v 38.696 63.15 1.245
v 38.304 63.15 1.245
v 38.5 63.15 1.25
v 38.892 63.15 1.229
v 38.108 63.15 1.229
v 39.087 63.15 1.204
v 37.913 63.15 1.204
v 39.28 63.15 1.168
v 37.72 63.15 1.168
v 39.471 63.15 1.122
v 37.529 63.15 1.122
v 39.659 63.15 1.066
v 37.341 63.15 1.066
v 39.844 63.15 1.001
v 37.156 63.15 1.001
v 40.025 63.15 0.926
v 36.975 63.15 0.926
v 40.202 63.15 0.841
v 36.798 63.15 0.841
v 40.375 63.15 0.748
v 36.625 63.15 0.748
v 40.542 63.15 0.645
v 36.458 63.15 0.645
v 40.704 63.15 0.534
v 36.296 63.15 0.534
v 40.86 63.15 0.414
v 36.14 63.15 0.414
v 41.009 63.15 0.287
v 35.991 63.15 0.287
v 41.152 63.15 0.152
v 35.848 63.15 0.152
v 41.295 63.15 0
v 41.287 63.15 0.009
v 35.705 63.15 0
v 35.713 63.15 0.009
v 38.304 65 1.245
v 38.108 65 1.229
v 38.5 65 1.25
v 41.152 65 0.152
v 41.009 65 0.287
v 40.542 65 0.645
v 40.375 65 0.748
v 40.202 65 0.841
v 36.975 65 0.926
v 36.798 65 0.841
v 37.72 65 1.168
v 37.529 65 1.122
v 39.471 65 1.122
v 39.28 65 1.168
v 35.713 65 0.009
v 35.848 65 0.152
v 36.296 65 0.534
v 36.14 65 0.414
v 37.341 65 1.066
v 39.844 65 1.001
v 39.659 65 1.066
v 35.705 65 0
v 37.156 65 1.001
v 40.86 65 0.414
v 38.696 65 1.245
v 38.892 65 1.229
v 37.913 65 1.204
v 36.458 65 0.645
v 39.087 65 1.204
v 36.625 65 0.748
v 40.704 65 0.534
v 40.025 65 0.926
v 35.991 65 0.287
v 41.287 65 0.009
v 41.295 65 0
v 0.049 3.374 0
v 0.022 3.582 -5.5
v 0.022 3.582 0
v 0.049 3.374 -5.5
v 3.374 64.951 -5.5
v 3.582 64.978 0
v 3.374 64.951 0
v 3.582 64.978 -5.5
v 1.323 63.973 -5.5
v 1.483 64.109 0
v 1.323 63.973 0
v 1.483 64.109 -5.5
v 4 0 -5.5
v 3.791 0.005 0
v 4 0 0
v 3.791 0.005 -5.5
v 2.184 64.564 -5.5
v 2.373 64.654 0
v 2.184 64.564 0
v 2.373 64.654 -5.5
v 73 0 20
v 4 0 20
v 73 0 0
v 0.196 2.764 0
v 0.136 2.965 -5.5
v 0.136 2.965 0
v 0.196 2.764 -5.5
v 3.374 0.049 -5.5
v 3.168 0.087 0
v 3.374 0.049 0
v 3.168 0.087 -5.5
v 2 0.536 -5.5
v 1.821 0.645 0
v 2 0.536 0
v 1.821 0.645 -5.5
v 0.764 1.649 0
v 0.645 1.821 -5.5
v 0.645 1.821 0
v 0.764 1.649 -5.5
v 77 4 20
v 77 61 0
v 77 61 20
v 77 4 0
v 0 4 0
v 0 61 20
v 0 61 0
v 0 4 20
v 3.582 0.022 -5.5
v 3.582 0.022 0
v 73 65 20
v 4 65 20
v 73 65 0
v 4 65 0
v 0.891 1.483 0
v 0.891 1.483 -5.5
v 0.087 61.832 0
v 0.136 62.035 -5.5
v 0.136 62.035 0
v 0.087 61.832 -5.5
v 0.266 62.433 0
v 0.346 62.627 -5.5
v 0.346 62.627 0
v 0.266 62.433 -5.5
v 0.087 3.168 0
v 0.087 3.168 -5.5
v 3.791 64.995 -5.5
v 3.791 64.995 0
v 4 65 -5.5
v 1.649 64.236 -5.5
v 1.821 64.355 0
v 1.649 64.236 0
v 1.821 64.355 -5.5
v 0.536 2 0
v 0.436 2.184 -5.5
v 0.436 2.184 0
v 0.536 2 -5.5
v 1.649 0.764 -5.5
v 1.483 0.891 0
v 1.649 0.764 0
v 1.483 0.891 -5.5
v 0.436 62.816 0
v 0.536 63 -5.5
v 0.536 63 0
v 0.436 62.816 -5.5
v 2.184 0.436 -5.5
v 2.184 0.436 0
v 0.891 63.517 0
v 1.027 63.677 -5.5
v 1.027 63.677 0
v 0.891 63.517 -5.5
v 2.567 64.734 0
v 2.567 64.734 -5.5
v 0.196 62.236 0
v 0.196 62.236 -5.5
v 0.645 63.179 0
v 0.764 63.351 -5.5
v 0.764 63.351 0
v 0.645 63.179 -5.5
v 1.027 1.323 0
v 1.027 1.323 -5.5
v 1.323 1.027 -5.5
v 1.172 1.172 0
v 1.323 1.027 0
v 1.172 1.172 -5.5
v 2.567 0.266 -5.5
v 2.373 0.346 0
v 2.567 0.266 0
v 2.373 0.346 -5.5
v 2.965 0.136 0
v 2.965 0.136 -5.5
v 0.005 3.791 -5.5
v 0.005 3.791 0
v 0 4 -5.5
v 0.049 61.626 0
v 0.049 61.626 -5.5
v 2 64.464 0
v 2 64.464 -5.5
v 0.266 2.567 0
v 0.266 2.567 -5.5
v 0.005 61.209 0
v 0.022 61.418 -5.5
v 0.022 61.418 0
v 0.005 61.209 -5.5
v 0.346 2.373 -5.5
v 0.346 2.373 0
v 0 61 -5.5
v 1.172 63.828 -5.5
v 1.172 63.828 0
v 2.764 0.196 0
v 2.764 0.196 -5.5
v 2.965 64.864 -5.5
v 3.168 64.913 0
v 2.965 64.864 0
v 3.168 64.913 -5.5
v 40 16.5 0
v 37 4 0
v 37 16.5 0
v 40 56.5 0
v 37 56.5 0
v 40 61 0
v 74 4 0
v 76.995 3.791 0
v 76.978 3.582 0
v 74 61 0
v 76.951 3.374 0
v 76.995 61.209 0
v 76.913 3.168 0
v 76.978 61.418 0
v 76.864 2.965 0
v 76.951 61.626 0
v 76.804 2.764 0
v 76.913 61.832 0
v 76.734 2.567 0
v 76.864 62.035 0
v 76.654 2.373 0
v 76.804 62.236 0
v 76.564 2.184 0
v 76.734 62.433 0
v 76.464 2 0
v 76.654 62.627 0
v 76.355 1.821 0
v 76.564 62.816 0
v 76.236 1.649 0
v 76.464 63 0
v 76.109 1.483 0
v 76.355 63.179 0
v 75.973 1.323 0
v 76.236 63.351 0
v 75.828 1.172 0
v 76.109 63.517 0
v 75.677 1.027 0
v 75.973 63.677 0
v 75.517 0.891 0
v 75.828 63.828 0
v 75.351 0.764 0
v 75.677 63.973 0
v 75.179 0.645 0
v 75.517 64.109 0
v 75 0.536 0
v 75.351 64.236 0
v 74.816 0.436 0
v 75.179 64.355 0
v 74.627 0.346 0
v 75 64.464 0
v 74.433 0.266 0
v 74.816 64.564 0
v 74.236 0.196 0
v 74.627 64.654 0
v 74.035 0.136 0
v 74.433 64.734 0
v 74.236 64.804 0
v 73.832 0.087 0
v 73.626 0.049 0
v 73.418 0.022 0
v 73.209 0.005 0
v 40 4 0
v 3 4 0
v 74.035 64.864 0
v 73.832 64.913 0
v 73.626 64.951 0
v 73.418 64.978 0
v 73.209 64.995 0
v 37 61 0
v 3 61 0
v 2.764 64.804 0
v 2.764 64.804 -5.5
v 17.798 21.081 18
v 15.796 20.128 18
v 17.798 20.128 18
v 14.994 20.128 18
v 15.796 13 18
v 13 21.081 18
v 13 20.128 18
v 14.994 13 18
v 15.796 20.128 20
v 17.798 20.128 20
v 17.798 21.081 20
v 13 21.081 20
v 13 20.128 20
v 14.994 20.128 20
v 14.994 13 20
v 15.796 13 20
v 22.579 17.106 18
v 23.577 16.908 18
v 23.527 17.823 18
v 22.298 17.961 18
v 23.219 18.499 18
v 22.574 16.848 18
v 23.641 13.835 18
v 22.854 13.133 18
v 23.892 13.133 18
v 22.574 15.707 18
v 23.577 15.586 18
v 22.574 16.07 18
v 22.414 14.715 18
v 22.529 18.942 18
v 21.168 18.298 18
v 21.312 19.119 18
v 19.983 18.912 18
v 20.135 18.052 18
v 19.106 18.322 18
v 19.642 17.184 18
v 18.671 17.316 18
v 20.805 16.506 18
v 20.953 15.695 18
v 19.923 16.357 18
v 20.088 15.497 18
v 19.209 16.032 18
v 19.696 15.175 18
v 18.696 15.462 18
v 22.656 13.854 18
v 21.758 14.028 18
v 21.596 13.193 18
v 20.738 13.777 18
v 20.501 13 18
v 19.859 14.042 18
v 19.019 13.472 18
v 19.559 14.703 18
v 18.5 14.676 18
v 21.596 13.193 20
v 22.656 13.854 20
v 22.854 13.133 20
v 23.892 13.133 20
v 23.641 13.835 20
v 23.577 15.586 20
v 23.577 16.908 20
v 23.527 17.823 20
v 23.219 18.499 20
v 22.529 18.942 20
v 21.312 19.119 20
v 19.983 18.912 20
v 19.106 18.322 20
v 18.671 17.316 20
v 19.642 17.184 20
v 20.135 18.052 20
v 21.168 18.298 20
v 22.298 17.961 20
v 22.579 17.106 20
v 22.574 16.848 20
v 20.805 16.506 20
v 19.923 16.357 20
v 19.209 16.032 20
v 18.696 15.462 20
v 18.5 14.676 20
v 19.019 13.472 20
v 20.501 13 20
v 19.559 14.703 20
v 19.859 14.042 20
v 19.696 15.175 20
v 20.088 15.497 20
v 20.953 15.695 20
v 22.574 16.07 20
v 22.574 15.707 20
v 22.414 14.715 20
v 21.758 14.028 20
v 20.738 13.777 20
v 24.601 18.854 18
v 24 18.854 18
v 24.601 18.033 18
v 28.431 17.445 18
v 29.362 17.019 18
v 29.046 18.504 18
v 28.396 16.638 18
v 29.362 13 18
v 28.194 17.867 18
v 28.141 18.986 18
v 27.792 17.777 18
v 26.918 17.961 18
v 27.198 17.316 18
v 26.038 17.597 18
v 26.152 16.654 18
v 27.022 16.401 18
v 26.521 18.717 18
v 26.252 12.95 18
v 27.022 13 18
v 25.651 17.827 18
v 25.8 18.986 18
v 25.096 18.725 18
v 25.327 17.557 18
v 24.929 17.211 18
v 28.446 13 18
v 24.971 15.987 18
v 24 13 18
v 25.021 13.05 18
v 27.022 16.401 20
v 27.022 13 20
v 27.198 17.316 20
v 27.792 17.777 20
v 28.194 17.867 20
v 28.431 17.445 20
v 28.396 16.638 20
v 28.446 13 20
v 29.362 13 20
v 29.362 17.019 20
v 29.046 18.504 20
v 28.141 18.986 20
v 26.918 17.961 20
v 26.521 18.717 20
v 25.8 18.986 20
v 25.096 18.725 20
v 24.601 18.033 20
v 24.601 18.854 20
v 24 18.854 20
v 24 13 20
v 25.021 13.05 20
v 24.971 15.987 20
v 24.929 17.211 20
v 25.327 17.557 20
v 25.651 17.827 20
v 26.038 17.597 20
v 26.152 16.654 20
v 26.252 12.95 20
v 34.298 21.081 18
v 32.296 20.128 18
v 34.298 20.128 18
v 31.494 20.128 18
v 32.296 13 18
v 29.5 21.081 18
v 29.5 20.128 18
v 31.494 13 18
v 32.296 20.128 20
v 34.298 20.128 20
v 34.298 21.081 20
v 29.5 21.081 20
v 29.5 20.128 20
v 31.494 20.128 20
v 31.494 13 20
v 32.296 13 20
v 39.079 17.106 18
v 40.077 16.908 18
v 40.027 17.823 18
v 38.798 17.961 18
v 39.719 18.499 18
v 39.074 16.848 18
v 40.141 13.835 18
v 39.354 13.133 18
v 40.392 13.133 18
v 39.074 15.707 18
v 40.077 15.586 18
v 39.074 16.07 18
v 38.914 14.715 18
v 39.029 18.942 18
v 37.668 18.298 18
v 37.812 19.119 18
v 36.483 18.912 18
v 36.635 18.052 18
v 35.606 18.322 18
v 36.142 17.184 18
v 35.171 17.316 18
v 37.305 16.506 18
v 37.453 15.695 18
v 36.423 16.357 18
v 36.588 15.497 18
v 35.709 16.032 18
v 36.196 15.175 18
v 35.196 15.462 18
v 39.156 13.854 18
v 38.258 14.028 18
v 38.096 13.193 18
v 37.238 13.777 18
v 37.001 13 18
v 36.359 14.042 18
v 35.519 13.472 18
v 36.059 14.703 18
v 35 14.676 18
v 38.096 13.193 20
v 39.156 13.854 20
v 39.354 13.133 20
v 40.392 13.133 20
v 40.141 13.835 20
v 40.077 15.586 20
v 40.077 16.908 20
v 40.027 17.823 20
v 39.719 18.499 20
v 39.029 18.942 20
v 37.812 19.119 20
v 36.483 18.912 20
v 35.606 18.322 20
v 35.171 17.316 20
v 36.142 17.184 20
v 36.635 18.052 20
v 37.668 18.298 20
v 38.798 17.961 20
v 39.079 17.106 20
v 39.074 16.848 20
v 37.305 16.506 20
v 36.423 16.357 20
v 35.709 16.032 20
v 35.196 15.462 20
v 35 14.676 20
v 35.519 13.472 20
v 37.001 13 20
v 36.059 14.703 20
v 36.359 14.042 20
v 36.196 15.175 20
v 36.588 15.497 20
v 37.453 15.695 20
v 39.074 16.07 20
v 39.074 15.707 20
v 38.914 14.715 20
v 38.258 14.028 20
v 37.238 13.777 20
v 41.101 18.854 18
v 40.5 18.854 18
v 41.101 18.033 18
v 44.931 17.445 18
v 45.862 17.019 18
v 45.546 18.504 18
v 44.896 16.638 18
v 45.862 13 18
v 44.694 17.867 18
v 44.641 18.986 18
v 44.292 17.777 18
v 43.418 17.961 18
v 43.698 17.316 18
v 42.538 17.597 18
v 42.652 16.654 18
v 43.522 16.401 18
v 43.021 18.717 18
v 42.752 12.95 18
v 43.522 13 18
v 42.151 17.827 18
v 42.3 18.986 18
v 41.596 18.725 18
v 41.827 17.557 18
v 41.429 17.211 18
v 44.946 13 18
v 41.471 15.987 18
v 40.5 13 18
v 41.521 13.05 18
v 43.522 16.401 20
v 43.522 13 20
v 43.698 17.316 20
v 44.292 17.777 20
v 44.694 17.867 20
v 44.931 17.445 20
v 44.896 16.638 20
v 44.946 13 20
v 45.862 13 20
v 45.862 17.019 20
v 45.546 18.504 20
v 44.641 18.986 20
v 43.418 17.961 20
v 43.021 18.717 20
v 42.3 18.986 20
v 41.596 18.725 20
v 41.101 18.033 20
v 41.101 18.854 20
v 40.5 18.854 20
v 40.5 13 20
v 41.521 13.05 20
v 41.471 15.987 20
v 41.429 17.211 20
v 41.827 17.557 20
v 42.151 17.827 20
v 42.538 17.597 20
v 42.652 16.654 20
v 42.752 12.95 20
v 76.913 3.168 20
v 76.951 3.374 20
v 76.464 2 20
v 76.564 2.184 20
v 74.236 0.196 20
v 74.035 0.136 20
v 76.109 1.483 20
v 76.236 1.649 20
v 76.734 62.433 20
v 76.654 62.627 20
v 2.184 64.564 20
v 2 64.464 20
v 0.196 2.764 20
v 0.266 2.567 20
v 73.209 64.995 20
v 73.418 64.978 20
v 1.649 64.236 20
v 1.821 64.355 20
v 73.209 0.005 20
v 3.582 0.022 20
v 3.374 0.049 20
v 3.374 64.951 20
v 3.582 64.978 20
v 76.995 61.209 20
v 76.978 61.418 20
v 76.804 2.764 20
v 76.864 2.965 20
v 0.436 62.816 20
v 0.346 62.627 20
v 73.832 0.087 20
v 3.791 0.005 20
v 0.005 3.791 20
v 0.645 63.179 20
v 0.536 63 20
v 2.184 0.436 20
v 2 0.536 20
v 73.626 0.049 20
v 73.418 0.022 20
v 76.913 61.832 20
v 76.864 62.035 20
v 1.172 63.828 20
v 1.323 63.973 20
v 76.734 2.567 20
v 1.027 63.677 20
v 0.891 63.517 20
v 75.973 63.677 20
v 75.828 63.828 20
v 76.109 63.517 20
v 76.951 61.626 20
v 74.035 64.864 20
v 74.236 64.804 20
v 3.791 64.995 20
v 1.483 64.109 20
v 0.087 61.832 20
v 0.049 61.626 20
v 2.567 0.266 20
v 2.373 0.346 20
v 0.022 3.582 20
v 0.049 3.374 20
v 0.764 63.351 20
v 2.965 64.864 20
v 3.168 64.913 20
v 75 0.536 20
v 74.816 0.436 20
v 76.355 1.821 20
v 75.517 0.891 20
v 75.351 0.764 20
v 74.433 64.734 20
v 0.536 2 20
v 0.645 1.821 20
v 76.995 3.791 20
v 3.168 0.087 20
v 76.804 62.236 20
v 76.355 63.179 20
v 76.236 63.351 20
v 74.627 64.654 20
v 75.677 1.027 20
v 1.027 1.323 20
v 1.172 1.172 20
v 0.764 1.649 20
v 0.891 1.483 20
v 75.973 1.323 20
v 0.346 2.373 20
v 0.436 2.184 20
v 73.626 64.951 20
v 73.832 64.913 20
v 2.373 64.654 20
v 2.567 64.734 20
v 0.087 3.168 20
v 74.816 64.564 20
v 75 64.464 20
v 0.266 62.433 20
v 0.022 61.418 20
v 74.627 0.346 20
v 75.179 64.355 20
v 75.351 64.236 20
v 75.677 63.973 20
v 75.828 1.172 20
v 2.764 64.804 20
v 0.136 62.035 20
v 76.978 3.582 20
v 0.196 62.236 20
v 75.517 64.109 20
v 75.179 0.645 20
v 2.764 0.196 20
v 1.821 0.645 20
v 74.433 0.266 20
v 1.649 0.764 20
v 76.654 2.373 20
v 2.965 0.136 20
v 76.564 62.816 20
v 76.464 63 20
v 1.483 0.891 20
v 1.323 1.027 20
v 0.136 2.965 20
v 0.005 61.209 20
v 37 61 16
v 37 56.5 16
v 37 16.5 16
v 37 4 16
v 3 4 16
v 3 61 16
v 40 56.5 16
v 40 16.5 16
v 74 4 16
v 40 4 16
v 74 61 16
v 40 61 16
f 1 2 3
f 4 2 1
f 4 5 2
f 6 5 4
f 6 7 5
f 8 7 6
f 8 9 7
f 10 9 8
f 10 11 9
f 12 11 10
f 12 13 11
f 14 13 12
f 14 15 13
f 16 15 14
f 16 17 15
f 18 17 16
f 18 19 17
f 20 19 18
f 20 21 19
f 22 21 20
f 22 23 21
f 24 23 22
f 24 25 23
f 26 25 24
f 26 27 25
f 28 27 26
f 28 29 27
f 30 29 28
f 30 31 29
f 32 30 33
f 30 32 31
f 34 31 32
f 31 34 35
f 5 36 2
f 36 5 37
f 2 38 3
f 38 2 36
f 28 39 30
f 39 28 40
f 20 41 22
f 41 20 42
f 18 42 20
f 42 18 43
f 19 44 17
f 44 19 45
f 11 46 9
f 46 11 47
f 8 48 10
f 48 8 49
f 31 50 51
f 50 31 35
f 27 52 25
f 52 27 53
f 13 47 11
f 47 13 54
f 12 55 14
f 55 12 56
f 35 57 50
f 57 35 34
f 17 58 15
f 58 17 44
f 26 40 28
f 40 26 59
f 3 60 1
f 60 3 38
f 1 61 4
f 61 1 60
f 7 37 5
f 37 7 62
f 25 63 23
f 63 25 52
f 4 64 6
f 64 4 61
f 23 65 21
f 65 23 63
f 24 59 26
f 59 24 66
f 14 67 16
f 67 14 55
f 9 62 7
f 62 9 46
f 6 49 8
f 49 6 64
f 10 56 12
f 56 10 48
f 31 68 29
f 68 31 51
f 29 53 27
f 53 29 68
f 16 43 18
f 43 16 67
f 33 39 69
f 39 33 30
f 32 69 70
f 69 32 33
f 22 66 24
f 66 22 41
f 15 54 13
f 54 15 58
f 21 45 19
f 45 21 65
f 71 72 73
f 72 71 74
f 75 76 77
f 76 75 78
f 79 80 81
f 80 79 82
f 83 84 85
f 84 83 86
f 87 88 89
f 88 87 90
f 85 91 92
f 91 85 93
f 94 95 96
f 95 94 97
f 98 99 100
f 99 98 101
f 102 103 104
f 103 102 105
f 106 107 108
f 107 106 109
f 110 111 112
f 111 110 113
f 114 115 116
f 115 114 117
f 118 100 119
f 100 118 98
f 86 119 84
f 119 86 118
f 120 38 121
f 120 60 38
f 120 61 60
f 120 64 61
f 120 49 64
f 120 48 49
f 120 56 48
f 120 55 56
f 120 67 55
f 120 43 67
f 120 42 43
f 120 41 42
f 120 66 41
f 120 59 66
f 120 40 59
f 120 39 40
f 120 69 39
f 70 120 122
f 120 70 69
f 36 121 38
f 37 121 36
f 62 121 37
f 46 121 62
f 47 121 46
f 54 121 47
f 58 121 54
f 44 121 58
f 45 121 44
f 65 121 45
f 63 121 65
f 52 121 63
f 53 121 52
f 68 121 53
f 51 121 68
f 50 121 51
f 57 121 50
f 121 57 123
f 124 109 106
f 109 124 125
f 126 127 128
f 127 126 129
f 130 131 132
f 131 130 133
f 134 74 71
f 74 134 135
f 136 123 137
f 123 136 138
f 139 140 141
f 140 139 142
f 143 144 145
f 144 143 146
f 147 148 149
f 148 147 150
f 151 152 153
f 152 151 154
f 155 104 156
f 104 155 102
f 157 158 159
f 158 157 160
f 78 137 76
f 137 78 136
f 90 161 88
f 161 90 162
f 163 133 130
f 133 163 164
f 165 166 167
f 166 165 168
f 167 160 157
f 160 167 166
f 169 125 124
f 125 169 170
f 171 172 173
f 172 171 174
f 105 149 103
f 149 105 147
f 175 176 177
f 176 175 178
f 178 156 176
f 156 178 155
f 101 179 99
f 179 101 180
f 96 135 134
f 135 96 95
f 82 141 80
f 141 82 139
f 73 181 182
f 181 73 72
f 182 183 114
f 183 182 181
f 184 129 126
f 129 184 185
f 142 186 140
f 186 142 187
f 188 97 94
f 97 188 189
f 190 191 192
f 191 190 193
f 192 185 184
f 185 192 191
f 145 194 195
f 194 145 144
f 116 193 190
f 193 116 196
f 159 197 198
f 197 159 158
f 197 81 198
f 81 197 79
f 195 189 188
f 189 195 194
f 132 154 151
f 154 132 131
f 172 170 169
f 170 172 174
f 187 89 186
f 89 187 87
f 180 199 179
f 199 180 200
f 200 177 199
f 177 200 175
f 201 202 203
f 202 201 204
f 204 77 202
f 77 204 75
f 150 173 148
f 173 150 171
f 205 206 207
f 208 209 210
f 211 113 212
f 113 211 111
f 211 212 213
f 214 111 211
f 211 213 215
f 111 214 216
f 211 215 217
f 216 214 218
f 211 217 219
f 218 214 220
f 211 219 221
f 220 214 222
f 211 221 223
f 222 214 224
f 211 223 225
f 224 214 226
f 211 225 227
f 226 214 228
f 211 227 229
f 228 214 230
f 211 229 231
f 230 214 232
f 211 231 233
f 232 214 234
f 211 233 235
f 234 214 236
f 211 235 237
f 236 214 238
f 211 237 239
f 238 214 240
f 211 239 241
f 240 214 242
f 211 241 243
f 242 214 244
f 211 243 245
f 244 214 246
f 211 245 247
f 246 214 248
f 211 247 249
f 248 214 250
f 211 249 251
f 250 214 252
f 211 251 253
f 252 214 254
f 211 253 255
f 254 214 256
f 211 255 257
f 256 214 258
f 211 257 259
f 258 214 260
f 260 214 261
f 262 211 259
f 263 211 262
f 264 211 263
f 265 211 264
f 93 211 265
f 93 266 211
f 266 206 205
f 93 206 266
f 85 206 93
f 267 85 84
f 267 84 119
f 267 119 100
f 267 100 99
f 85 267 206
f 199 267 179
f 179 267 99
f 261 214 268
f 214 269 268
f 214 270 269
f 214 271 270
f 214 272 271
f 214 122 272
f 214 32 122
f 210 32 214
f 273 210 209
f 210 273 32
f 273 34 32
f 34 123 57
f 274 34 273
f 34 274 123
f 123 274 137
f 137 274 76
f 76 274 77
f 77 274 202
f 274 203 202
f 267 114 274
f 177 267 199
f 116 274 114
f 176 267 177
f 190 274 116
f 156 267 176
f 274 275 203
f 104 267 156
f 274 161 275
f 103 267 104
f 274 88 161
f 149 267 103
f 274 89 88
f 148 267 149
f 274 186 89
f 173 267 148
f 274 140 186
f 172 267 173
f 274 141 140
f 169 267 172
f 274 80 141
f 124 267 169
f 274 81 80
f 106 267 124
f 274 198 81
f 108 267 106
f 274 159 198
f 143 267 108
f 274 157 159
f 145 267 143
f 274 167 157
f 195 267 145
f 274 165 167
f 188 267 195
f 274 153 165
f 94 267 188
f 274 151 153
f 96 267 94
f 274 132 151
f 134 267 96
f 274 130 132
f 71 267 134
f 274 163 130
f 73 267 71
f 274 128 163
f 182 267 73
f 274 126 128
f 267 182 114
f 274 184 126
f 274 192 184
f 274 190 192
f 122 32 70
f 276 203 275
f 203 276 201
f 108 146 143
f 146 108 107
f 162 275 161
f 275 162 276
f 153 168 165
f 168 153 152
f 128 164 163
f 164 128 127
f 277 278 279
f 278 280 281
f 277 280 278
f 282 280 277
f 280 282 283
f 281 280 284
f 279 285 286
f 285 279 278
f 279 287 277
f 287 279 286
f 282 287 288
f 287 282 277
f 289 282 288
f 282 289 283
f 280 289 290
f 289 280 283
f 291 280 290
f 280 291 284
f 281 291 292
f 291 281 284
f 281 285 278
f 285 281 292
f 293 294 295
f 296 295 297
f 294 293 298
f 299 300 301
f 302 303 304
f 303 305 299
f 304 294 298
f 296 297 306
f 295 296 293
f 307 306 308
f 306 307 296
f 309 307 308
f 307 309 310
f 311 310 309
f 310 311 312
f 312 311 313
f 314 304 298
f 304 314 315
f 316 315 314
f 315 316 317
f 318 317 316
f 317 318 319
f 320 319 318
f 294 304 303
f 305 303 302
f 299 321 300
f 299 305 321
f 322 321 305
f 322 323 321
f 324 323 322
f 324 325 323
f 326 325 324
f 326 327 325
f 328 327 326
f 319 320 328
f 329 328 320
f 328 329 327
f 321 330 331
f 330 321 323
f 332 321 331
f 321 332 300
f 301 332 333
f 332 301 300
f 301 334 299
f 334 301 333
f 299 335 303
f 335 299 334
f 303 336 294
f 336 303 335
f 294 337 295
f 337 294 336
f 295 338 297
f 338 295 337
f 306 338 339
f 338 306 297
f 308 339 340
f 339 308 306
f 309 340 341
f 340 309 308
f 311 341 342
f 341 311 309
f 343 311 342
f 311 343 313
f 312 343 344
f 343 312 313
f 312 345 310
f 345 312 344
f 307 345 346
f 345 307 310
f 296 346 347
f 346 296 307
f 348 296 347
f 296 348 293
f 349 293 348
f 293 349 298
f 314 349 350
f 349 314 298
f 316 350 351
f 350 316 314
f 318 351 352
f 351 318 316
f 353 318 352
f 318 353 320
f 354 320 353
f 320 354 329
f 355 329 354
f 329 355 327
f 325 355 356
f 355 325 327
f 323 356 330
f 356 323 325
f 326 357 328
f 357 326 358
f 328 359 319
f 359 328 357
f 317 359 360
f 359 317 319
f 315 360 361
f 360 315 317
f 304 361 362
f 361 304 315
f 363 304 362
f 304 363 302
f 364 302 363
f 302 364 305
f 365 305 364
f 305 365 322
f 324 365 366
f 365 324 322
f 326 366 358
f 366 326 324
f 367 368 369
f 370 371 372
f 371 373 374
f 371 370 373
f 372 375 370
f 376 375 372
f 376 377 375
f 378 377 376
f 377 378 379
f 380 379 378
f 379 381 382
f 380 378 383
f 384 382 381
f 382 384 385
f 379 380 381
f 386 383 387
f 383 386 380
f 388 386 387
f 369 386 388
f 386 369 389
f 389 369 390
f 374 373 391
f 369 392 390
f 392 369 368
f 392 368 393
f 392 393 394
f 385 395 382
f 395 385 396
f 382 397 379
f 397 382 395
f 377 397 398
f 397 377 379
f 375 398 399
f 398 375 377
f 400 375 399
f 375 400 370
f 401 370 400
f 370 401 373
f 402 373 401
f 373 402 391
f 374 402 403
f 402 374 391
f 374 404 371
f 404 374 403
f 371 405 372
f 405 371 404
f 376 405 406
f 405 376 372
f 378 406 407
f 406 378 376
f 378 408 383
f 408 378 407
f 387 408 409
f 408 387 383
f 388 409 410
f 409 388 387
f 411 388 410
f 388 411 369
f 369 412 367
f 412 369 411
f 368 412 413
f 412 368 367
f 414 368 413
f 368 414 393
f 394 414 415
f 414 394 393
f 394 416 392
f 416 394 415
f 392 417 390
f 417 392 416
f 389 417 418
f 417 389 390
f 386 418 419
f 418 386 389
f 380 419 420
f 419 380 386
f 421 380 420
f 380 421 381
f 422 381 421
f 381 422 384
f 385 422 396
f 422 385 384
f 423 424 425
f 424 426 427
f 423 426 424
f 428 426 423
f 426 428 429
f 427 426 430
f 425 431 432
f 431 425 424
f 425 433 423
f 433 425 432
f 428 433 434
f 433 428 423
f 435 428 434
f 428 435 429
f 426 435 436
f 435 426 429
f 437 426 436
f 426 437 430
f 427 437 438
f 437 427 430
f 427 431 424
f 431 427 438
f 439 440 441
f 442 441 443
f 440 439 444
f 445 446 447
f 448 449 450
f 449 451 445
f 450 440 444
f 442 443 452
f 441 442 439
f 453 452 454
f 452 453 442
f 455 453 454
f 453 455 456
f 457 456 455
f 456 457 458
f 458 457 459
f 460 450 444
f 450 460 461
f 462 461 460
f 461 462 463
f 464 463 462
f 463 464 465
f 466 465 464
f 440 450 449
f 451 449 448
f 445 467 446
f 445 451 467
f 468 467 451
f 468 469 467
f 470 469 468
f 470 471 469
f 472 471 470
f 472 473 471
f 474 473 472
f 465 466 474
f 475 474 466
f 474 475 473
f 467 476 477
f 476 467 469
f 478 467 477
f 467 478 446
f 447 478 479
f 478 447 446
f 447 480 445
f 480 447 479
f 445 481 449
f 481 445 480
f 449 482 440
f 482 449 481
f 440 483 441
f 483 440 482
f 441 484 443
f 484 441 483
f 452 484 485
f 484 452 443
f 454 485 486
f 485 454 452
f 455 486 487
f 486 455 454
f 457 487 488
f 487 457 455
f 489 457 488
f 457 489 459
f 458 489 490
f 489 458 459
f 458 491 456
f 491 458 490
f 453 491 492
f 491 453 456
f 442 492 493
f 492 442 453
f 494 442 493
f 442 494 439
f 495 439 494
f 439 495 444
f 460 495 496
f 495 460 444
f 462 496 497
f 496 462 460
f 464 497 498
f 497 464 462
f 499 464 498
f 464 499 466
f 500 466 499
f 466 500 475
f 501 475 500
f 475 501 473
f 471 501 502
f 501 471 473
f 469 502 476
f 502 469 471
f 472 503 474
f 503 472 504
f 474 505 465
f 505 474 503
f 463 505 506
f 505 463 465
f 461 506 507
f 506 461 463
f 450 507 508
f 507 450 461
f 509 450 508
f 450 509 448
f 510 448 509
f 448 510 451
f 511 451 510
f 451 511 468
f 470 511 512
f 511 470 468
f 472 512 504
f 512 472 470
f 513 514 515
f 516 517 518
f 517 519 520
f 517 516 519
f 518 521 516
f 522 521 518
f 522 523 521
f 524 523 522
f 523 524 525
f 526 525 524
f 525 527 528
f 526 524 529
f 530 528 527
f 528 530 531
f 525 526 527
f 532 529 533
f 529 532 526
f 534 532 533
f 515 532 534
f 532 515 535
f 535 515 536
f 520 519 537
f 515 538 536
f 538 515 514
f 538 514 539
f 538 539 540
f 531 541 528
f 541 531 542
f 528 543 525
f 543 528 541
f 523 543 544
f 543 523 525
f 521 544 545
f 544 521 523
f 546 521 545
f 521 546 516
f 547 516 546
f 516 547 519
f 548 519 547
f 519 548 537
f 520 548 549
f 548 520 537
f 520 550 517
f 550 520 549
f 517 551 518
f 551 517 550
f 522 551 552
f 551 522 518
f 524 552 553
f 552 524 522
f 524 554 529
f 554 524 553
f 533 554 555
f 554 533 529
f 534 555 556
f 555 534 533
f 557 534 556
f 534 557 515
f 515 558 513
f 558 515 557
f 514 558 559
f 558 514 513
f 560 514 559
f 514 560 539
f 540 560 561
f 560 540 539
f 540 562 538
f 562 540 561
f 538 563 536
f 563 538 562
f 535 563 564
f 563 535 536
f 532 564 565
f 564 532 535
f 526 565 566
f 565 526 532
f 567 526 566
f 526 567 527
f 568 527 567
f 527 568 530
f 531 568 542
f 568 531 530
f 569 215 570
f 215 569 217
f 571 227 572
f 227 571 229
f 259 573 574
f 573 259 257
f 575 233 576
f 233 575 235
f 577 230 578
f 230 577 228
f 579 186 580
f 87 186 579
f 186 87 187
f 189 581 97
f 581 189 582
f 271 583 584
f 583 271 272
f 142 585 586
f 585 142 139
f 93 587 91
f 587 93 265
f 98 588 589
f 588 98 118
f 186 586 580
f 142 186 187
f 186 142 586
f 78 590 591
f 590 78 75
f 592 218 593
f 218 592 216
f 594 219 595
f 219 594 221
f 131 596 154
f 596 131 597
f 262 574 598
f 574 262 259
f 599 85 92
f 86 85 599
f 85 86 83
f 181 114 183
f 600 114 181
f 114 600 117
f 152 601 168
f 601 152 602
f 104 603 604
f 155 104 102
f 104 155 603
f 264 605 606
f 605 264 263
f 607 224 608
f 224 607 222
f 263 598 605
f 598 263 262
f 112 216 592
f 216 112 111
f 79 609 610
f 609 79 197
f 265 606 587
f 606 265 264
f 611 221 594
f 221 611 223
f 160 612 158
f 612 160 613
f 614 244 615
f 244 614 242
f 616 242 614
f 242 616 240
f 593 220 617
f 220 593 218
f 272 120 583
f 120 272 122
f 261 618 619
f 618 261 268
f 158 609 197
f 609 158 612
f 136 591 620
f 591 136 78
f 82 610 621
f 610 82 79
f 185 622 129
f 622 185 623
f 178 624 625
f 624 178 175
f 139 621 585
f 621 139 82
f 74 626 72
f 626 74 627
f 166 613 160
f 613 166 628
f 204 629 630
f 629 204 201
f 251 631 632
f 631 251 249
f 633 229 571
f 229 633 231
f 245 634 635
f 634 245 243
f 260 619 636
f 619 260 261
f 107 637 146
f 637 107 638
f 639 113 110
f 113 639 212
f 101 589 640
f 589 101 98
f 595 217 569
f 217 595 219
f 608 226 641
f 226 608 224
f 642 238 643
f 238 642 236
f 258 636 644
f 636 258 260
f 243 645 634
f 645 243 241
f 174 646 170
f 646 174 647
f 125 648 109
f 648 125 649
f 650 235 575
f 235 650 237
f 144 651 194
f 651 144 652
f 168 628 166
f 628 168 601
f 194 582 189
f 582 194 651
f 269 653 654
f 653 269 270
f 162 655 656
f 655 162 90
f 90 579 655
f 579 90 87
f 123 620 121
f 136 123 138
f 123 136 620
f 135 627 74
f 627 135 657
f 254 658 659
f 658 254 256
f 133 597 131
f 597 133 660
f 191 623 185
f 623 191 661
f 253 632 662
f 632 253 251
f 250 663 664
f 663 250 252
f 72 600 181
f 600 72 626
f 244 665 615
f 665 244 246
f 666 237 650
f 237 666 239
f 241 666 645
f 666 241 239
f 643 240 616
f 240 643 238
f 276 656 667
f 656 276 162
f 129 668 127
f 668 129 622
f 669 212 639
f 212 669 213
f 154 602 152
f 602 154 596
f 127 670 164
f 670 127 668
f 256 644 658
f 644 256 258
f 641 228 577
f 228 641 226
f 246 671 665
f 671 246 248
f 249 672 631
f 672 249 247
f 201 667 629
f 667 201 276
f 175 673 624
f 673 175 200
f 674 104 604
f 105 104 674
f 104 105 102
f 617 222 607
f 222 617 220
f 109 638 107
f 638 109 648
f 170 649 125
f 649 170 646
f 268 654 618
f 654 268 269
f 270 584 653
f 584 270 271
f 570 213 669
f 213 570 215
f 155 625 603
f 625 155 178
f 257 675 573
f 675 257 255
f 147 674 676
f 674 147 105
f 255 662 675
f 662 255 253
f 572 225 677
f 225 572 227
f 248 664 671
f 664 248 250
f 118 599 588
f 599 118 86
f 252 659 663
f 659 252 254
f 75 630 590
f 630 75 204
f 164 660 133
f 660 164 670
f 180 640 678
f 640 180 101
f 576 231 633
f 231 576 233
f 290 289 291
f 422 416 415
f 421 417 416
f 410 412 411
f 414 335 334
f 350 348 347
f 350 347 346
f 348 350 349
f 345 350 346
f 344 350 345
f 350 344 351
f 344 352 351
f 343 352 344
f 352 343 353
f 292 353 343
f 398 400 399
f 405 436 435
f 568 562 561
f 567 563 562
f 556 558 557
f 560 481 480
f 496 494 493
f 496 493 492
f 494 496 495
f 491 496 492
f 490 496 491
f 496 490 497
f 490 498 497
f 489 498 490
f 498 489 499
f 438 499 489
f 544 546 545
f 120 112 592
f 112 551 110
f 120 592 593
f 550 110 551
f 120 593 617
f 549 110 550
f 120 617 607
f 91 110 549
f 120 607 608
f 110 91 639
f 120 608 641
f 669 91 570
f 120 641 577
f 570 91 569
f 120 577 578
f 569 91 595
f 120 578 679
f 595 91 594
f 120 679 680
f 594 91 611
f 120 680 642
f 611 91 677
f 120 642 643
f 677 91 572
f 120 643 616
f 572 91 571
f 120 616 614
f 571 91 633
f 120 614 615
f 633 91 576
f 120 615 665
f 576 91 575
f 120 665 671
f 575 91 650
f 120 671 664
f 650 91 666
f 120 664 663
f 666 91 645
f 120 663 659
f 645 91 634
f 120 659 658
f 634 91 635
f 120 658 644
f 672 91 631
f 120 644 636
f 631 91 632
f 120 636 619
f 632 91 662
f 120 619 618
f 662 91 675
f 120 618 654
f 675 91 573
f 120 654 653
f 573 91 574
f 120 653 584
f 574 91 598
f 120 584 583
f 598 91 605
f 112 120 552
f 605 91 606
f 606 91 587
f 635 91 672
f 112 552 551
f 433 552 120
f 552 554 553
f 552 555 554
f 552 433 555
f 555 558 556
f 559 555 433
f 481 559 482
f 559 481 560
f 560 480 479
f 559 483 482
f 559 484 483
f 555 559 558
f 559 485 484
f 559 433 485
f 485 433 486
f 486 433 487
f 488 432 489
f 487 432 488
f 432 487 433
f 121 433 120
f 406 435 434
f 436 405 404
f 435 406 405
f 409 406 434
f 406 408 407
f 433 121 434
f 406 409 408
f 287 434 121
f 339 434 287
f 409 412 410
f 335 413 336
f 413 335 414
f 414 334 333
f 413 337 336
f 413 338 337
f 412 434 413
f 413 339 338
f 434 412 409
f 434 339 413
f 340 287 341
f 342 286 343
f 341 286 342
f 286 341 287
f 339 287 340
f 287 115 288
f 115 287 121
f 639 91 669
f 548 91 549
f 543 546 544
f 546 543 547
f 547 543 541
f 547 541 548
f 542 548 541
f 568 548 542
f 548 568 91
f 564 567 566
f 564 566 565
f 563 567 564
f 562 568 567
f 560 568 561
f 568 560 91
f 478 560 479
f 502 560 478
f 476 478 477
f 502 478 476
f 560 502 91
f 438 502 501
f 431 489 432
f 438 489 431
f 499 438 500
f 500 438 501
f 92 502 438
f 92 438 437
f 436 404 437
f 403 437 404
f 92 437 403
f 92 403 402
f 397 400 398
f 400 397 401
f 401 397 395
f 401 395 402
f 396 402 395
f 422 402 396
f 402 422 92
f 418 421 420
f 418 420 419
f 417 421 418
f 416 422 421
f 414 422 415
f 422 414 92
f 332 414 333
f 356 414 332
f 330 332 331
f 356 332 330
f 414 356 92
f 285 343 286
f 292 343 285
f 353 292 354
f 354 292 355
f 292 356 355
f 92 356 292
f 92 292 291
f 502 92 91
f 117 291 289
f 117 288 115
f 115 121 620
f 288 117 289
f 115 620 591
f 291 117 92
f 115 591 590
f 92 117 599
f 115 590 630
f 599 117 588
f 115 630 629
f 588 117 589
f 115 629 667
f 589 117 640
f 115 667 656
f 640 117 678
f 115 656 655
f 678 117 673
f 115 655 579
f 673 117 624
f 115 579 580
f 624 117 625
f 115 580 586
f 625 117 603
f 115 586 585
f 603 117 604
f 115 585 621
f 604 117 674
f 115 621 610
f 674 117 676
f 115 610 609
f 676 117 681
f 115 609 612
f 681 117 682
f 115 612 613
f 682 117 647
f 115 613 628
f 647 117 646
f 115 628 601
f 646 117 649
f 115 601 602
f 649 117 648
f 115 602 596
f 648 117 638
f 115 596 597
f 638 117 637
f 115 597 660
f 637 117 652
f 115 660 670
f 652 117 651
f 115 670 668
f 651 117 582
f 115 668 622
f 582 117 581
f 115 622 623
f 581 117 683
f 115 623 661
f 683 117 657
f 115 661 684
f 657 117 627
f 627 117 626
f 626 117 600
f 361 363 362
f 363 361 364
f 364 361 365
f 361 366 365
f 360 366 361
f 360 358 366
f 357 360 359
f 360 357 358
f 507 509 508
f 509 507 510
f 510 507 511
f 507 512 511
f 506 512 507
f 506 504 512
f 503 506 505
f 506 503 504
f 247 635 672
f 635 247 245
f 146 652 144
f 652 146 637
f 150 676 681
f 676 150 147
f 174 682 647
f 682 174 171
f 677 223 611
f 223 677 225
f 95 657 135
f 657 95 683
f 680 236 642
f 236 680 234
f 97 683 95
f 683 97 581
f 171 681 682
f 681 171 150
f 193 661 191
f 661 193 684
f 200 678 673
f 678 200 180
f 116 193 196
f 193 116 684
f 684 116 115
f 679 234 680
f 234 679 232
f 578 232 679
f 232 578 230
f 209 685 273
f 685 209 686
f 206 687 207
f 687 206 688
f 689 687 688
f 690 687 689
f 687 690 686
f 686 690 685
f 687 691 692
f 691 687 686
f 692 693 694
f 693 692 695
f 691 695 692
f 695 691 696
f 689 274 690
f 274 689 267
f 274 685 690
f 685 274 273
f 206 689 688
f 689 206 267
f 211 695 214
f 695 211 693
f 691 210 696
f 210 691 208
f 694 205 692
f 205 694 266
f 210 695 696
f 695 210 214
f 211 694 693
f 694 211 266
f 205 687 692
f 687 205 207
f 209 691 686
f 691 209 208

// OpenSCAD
// file: mg90s.scad
/***********************************************************************
 *                              mg90s                                  *
 ***********************************************************************
 * @author FioPio   (Ferriol Pey Comas)  ferriol73pey@gmail.com        *
 * @version v1.3    20/01/2018                                         *
 ***********************************************************************
 * This file contains the 3D model of microservos mg90s, this has been *
 * done tinking on tamtam, a minihumanoid low cost designed by me,     *
 * FioPio, but it may be used on other projects due the license of     *
 * this. Please check the LICENSE file to know the details.            *
 ***********************************************************************/

$fn=120;

/***********************************************************************
 *                              mg90s                                  *
 ***********************************************************************
 * This module creates a mg90s solid.                                  *
 ***********************************************************************
 * @param alpha (optional) it's the rotation angle of the holder of    *
 *        the servo. If you don't use this it will not apear.          *
 * @param is_cutted (optional) if it is set to true, the "ears" of the *
 *        servo will desapear, in order to have a module without it if *
 *        needed.                                                      *
 ***********************************************************************/
module mg90s(alpha=-1,is_cutted= false,two_axies=false )
{
   translate([-6.5,-6.5])
	  {
      cube([23,13,23]);	
      if(!is_cutted)
      {
				     translate([-5,0,18.75])union()
				     {
            cube([33,13,3]);
            translate([2.5,6.5,-(10-2.5)/2-4])cylinder(r=.75,h=15);
            translate([2.5,6.5,10-(10-2.5)/2])cylinder(r=2.5,h=5);
            translate([33-2.5,6.5,-(10-2.5)/2-4])cylinder(r=.75,h=15);
            translate([33-2.5,6.5,10-(10-2.5)/2])cylinder(r=2.5,h=5);
	   					}
   			}
   			if(two_axies)
   			{
   				  translate([6.5,6.5,-1.2])                                             //Continuation of the axis
   	     {
   							   cylinder(r1=1,r2=1.9,h=1.2);
	   						   translate([0,0,0.01])cylinder(r1=1,r2=1.9,h=1.2);
	   						   translate([0,0,-8])cylinder(r=1,h=9);
	   					}
   			}
      translate([6.5,6.5])cylinder(r=6.5,h=29);
      translate([12.5,6.5])cylinder(r=3.5,h=29);
      translate([6.5,6.5])cylinder(r=3.75,h=35.1);
      translate([-4,3.5,4.5])cube([5,5,2]);
      if(alpha!=-1)
      {
   				   translate([6.5,6.5,23+6+6.1-2])rotate([0,0,alpha])union()
   				   {
   				      hull()
   				      {
	   							     cylinder(r=3.75,h=2);
	   							     translate([16,0])cylinder(r=2.25,h=2);
   							   }
	   						   //holes for the screws (there is one every 2 mm)
	   						   translate([4.5,0,-5])cylinder(r=.5,h=12);
   							   translate([12.5,0,-5])cylinder(r=.5,h=12);
	   						}
   			}
   }
} 
// file: body_data.scad
/***********************************************************************
 *                             body_data                               *
 ***********************************************************************
 * @author FioPio   (Ferriol Pey Comas)  ferriol73pey@gmail.com        *
 * @version v1.0    11/12/2018                                         *
 ***********************************************************************
 * This file contains the information needed for building the body and *
 * it's front and back covers.                                         *
 ***********************************************************************/
 
use <mg90s.scad>
$fn=120;

feet_separation=10;
body_width=67+feet_separation;
body_height=65;
R=4;

module holder()
{
   difference()
   {
      translate([-4,-2])cube([8,5.5,2]);
      translate([-3,-1.5,-1])cube([6,4,5]);
   }
   translate([-3,-1.5,0])rotate([26.565,0,0])cube([6,5.5,2]);
}
// main file
/***********************************************************************
 *                         body_front_cover                            *
 ***********************************************************************
 * @author  FioPio    (Ferriol Pey Comas)   ferriol73pey@gmail.com     *
 * @version v1.2       07/12/2018                                      *
 ***********************************************************************
 * This file contains the 3D model of the body part that covers the    *
 * the battery. The write function has been done by Harlan Martin.     *
 ***********************************************************************/
include <body_data.scad>
use<write/write.scad>

back_cover_height=20;
R_S=8;
offset_back=0;

battery_length=34;
battery_width=16+10;
battery_heigth=57;

difference()
{
	  translate([0,0,-5.5])hull()
	  {
				   translate([R,R])cylinder(r=R,h=5.5);
							translate([R,body_height-R])cylinder(r=R,h=5.5);
							translate([body_width-R,body_height-R])cylinder(r=R,h=5.5);
							translate([body_width-R,R])cylinder(r=R,h=5.5);
							
							translate([R,R,back_cover_height-R_S+5.5])cylinder(r=R,h=R_S);
							translate([R,body_height-R-offset_back,back_cover_height-R_S+5.5])cylinder(r=R,h=R_S);
							translate([body_width-R,body_height-R-offset_back,back_cover_height-R_S+5.5])cylinder(r=R,h=R_S);
							translate([body_width-R,R,back_cover_height-R_S+5.5])cylinder(r=R,h=R_S);
			}
			translate([body_width,0,0])rotate([0,180])union()
			{
						hull()
						{
									translate([R,R])cylinder(r=R,h=12);
									translate([R,body_height-R])cylinder(r=R,h=12);
									translate([body_width-R,body_height-R])cylinder(r=R,h=12);
									translate([body_width-R,R])cylinder(r=R,h=12);
						}
						translate([body_width/2,33+body_height+0.25,2.5])rotate([0,-90,90])mg90s(0,true);
						translate([body_width/2,2,2])rotate([90,0])translate([-3,-1.5,-1.25])cube([6,4,5.5]);
						translate([body_width/2-20,body_height-2,2])rotate([90,0,180])translate([-3,-1.5,-1.25])cube([6,4,5.5]);
 					translate([body_width/2+20,body_height-2,2])rotate([90,0,180])translate([-3,-1.5,-1])cube([6,4,5.5]);
			}
	  translate([3,4,-10])cube([battery_length,battery_heigth,battery_width]);		
	  translate([body_width-3-battery_length,4,-10])cube([battery_length,battery_heigth,battery_width]);
	  translate([body_width/2,body_height/2+4])hull()
			{
				   translate([6-2.5,20-2.5,-10])cylinder(r=2.5,h=battery_width);
				   translate([6-2.5,-20+2.5,-10])cylinder(r=2.5,h=battery_width);
				   translate([-6+2.5,-20+2.5,-10])cylinder(r=2.5,h=battery_width);
				   translate([-6+2.5,20-2.5,-10])cylinder(r=2.5,h=battery_width);
			}
			translate([R_S+5,R_S+5,back_cover_height-2])write("TamTam",t=4,h=8);		
}
